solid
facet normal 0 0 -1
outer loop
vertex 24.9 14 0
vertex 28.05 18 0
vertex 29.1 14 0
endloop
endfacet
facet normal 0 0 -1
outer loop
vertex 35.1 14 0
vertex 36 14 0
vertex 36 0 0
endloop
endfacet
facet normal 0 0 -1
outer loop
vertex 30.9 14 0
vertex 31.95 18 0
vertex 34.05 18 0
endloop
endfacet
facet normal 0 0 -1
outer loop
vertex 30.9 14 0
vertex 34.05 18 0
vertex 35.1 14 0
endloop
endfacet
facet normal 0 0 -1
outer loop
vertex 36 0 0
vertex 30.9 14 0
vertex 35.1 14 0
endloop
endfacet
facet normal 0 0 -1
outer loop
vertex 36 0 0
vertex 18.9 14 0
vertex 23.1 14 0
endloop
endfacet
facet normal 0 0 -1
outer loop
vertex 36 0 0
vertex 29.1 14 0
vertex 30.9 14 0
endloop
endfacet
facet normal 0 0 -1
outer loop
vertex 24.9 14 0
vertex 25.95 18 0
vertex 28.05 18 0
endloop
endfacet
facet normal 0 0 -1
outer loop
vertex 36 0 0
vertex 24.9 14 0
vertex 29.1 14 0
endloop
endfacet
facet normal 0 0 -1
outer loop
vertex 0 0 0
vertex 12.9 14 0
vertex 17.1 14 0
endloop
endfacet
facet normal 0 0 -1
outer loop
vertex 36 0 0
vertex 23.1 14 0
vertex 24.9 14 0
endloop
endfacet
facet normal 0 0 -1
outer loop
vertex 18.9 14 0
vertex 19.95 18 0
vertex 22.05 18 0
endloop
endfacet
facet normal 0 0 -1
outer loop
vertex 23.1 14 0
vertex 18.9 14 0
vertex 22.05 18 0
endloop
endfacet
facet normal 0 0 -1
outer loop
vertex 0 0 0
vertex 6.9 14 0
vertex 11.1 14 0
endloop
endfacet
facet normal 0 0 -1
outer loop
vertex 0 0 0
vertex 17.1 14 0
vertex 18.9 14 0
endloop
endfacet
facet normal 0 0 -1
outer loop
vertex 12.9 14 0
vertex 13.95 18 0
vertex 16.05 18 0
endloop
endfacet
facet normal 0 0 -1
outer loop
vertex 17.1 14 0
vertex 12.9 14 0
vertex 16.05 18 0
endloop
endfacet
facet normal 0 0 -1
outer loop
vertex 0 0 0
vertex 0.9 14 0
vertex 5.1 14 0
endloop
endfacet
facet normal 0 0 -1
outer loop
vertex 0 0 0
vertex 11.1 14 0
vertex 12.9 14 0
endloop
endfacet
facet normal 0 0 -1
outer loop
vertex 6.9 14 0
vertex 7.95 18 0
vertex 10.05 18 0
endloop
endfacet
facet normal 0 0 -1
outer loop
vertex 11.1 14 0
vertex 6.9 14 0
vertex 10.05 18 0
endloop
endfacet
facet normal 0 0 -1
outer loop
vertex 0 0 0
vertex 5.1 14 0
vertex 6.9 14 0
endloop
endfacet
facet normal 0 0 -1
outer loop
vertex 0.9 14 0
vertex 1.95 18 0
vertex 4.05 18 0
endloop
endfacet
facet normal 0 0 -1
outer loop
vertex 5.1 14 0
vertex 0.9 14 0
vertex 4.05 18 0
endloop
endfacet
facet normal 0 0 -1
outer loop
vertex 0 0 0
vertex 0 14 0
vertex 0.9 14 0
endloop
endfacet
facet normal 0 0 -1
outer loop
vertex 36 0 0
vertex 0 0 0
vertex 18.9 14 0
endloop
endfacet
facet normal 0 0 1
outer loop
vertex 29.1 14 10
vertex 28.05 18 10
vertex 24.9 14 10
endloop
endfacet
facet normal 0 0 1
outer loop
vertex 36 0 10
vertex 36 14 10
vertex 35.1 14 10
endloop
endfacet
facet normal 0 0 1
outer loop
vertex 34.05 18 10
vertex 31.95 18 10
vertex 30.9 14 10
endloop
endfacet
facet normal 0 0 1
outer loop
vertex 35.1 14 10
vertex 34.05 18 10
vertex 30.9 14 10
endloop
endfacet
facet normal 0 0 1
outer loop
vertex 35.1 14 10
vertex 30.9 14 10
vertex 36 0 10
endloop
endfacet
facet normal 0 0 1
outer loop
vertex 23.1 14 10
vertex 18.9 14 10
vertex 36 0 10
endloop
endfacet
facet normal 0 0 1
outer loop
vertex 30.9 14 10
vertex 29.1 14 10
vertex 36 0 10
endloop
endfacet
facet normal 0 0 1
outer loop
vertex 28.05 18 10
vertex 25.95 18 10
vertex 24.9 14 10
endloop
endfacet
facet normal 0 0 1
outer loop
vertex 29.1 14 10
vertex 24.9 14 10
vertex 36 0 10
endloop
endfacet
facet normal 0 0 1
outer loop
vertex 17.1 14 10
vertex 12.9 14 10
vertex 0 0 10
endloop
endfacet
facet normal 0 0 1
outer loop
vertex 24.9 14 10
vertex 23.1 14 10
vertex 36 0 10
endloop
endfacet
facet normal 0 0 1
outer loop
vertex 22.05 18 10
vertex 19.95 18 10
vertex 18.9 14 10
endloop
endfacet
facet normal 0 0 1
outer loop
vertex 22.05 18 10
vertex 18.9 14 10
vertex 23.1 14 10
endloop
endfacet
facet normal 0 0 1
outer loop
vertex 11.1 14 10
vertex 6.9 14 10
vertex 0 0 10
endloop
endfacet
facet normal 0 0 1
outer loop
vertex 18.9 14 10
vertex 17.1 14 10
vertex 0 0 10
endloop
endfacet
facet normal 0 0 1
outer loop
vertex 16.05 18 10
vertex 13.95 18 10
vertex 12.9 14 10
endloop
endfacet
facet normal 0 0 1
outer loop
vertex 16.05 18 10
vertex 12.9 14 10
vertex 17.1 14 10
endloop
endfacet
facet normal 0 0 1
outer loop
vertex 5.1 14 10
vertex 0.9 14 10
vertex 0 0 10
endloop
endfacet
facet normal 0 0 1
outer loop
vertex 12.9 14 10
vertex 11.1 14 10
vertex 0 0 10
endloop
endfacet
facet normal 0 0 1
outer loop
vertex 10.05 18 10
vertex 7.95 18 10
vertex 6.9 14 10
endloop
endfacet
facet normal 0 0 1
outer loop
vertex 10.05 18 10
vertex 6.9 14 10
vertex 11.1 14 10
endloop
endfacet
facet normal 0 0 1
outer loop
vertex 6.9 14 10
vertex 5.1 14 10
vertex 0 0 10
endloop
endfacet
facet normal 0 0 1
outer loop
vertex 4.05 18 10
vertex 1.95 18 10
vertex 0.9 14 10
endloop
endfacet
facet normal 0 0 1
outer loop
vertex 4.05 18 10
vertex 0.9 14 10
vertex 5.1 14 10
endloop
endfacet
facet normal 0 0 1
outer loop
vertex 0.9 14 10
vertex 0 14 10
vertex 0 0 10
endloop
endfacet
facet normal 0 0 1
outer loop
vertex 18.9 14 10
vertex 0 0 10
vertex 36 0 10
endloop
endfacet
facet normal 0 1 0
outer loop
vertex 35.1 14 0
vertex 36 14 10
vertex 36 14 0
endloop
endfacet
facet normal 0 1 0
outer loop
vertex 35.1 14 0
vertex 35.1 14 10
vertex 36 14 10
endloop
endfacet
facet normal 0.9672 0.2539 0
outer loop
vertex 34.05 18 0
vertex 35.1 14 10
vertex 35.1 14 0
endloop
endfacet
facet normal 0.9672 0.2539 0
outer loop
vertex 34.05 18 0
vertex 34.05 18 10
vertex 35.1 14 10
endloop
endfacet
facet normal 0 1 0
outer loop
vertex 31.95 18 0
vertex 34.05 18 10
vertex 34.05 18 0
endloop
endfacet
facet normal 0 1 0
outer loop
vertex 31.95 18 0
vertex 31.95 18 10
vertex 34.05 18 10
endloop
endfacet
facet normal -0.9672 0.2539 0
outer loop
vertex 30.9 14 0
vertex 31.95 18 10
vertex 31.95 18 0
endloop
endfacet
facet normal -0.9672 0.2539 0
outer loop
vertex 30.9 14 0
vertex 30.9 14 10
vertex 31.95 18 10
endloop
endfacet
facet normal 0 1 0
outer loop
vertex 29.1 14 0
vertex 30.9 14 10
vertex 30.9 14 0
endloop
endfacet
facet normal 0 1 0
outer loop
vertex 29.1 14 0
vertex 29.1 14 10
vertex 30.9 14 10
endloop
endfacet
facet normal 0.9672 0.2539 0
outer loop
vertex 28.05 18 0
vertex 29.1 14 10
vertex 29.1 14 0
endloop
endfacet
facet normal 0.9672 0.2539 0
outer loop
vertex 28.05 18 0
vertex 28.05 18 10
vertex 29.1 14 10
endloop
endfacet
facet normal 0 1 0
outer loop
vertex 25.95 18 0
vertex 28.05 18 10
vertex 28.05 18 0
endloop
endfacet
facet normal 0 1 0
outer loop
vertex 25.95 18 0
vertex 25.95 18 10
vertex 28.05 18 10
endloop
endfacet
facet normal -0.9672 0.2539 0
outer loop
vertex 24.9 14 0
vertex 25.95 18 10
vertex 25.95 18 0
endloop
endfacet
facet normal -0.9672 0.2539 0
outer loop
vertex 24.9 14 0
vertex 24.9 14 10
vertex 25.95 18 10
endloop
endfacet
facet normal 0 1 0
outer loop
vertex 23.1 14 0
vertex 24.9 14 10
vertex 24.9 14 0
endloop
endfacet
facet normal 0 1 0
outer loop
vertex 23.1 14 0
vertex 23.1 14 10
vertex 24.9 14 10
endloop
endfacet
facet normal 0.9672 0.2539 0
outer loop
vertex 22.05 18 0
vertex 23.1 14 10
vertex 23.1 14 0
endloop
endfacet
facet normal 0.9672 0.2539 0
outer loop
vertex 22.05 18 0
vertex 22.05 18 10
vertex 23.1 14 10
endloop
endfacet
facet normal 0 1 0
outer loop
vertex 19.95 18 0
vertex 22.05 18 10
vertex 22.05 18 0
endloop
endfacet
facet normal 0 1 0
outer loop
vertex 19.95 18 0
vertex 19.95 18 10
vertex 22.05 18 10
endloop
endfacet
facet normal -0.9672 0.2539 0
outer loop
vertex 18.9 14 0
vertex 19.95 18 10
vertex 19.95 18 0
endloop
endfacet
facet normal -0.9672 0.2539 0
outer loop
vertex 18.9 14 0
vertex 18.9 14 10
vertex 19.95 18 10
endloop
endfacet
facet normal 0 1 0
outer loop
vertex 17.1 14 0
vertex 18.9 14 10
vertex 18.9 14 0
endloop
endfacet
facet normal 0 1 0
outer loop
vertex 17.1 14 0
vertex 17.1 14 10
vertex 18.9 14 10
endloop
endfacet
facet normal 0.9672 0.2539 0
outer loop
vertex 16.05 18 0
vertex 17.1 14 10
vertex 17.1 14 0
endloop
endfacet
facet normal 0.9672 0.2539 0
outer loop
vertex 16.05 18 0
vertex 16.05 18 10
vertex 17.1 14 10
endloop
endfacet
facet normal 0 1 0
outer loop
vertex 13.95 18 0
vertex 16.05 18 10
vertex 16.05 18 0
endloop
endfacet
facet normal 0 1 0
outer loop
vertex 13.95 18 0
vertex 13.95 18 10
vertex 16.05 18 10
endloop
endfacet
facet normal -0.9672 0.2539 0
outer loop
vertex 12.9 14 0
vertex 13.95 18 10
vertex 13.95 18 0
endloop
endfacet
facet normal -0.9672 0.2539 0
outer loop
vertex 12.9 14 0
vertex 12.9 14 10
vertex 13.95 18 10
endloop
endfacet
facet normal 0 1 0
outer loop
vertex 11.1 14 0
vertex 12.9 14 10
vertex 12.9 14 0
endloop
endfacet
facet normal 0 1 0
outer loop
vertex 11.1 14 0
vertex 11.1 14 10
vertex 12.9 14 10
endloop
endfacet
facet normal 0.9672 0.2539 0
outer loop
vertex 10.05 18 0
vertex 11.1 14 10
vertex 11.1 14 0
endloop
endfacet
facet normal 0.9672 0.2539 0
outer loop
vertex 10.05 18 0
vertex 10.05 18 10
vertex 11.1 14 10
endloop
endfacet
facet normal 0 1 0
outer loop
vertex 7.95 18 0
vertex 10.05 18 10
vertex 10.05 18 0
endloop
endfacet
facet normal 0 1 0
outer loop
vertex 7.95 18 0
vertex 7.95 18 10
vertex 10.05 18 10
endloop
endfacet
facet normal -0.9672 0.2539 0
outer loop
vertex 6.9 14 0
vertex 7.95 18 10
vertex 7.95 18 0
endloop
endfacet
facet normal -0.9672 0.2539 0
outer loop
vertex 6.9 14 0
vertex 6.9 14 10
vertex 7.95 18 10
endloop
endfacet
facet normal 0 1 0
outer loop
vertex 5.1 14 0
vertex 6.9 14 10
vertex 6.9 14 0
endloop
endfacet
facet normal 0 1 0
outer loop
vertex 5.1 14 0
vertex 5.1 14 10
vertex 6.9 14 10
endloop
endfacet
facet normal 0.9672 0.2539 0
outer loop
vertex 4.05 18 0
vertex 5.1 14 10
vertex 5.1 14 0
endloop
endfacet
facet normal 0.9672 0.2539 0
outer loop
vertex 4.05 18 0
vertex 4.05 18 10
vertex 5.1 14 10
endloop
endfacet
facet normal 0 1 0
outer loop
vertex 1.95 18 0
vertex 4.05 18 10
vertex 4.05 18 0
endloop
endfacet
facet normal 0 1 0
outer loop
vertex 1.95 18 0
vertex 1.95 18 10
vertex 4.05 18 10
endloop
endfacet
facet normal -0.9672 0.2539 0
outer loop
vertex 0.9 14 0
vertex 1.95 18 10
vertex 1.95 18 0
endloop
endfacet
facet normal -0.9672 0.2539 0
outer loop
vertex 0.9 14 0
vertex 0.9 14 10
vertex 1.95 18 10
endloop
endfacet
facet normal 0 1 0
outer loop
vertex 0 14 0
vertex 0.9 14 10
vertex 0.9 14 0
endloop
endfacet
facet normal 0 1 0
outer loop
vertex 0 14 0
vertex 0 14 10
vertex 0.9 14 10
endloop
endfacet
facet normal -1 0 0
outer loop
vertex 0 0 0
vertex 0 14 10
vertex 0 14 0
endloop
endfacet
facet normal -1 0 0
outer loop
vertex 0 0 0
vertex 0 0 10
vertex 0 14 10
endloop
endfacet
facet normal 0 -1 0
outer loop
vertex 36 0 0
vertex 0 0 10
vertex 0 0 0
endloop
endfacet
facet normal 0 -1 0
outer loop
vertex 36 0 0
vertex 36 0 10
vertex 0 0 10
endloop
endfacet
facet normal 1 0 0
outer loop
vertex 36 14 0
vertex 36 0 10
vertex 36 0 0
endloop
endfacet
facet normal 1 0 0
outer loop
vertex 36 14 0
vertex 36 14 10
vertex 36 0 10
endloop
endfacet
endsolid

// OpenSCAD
$fn = 32;

// ----------------------------------------------------------------------
// Gear rack: 6 teeth, pitch 6 mm
// ----------------------------------------------------------------------

// --- parameters (mm) ---
teeth = 6;                // number of teeth
pitch = 6;                // tooth pitch, X
root_w = 4.2;             // tooth width at the root
tip_w = 2.1;              // tooth width at the tip
base_h = 14;              // rack body height, Y
tooth_h = 4;              // tooth height above the body
plate_t = 10;             // rack width, Z (extrusion height)

rack_l = teeth * pitch;  // overall length
total_h = base_h + tooth_h;  // overall height

profile = [[0, 0], [36, 0], [36, 14], [35.1, 14], [34.05, 18], [31.95, 18], [30.9, 14], [29.1, 14], [28.05, 18], [25.95, 18], [24.9, 14], [23.1, 14], [22.05, 18], [19.95, 18], [18.9, 14], [17.1, 14], [16.05, 18], [13.95, 18], [12.9, 14], [11.1, 14], [10.05, 18], [7.95, 18], [6.9, 14], [5.1, 14], [4.05, 18], [1.95, 18], [0.9, 14], [0, 14]];  // primary outline, 28 points, counter clockwise

// --- the one profile operation ---
linear_extrude(height = plate_t) polygon(points = profile);
